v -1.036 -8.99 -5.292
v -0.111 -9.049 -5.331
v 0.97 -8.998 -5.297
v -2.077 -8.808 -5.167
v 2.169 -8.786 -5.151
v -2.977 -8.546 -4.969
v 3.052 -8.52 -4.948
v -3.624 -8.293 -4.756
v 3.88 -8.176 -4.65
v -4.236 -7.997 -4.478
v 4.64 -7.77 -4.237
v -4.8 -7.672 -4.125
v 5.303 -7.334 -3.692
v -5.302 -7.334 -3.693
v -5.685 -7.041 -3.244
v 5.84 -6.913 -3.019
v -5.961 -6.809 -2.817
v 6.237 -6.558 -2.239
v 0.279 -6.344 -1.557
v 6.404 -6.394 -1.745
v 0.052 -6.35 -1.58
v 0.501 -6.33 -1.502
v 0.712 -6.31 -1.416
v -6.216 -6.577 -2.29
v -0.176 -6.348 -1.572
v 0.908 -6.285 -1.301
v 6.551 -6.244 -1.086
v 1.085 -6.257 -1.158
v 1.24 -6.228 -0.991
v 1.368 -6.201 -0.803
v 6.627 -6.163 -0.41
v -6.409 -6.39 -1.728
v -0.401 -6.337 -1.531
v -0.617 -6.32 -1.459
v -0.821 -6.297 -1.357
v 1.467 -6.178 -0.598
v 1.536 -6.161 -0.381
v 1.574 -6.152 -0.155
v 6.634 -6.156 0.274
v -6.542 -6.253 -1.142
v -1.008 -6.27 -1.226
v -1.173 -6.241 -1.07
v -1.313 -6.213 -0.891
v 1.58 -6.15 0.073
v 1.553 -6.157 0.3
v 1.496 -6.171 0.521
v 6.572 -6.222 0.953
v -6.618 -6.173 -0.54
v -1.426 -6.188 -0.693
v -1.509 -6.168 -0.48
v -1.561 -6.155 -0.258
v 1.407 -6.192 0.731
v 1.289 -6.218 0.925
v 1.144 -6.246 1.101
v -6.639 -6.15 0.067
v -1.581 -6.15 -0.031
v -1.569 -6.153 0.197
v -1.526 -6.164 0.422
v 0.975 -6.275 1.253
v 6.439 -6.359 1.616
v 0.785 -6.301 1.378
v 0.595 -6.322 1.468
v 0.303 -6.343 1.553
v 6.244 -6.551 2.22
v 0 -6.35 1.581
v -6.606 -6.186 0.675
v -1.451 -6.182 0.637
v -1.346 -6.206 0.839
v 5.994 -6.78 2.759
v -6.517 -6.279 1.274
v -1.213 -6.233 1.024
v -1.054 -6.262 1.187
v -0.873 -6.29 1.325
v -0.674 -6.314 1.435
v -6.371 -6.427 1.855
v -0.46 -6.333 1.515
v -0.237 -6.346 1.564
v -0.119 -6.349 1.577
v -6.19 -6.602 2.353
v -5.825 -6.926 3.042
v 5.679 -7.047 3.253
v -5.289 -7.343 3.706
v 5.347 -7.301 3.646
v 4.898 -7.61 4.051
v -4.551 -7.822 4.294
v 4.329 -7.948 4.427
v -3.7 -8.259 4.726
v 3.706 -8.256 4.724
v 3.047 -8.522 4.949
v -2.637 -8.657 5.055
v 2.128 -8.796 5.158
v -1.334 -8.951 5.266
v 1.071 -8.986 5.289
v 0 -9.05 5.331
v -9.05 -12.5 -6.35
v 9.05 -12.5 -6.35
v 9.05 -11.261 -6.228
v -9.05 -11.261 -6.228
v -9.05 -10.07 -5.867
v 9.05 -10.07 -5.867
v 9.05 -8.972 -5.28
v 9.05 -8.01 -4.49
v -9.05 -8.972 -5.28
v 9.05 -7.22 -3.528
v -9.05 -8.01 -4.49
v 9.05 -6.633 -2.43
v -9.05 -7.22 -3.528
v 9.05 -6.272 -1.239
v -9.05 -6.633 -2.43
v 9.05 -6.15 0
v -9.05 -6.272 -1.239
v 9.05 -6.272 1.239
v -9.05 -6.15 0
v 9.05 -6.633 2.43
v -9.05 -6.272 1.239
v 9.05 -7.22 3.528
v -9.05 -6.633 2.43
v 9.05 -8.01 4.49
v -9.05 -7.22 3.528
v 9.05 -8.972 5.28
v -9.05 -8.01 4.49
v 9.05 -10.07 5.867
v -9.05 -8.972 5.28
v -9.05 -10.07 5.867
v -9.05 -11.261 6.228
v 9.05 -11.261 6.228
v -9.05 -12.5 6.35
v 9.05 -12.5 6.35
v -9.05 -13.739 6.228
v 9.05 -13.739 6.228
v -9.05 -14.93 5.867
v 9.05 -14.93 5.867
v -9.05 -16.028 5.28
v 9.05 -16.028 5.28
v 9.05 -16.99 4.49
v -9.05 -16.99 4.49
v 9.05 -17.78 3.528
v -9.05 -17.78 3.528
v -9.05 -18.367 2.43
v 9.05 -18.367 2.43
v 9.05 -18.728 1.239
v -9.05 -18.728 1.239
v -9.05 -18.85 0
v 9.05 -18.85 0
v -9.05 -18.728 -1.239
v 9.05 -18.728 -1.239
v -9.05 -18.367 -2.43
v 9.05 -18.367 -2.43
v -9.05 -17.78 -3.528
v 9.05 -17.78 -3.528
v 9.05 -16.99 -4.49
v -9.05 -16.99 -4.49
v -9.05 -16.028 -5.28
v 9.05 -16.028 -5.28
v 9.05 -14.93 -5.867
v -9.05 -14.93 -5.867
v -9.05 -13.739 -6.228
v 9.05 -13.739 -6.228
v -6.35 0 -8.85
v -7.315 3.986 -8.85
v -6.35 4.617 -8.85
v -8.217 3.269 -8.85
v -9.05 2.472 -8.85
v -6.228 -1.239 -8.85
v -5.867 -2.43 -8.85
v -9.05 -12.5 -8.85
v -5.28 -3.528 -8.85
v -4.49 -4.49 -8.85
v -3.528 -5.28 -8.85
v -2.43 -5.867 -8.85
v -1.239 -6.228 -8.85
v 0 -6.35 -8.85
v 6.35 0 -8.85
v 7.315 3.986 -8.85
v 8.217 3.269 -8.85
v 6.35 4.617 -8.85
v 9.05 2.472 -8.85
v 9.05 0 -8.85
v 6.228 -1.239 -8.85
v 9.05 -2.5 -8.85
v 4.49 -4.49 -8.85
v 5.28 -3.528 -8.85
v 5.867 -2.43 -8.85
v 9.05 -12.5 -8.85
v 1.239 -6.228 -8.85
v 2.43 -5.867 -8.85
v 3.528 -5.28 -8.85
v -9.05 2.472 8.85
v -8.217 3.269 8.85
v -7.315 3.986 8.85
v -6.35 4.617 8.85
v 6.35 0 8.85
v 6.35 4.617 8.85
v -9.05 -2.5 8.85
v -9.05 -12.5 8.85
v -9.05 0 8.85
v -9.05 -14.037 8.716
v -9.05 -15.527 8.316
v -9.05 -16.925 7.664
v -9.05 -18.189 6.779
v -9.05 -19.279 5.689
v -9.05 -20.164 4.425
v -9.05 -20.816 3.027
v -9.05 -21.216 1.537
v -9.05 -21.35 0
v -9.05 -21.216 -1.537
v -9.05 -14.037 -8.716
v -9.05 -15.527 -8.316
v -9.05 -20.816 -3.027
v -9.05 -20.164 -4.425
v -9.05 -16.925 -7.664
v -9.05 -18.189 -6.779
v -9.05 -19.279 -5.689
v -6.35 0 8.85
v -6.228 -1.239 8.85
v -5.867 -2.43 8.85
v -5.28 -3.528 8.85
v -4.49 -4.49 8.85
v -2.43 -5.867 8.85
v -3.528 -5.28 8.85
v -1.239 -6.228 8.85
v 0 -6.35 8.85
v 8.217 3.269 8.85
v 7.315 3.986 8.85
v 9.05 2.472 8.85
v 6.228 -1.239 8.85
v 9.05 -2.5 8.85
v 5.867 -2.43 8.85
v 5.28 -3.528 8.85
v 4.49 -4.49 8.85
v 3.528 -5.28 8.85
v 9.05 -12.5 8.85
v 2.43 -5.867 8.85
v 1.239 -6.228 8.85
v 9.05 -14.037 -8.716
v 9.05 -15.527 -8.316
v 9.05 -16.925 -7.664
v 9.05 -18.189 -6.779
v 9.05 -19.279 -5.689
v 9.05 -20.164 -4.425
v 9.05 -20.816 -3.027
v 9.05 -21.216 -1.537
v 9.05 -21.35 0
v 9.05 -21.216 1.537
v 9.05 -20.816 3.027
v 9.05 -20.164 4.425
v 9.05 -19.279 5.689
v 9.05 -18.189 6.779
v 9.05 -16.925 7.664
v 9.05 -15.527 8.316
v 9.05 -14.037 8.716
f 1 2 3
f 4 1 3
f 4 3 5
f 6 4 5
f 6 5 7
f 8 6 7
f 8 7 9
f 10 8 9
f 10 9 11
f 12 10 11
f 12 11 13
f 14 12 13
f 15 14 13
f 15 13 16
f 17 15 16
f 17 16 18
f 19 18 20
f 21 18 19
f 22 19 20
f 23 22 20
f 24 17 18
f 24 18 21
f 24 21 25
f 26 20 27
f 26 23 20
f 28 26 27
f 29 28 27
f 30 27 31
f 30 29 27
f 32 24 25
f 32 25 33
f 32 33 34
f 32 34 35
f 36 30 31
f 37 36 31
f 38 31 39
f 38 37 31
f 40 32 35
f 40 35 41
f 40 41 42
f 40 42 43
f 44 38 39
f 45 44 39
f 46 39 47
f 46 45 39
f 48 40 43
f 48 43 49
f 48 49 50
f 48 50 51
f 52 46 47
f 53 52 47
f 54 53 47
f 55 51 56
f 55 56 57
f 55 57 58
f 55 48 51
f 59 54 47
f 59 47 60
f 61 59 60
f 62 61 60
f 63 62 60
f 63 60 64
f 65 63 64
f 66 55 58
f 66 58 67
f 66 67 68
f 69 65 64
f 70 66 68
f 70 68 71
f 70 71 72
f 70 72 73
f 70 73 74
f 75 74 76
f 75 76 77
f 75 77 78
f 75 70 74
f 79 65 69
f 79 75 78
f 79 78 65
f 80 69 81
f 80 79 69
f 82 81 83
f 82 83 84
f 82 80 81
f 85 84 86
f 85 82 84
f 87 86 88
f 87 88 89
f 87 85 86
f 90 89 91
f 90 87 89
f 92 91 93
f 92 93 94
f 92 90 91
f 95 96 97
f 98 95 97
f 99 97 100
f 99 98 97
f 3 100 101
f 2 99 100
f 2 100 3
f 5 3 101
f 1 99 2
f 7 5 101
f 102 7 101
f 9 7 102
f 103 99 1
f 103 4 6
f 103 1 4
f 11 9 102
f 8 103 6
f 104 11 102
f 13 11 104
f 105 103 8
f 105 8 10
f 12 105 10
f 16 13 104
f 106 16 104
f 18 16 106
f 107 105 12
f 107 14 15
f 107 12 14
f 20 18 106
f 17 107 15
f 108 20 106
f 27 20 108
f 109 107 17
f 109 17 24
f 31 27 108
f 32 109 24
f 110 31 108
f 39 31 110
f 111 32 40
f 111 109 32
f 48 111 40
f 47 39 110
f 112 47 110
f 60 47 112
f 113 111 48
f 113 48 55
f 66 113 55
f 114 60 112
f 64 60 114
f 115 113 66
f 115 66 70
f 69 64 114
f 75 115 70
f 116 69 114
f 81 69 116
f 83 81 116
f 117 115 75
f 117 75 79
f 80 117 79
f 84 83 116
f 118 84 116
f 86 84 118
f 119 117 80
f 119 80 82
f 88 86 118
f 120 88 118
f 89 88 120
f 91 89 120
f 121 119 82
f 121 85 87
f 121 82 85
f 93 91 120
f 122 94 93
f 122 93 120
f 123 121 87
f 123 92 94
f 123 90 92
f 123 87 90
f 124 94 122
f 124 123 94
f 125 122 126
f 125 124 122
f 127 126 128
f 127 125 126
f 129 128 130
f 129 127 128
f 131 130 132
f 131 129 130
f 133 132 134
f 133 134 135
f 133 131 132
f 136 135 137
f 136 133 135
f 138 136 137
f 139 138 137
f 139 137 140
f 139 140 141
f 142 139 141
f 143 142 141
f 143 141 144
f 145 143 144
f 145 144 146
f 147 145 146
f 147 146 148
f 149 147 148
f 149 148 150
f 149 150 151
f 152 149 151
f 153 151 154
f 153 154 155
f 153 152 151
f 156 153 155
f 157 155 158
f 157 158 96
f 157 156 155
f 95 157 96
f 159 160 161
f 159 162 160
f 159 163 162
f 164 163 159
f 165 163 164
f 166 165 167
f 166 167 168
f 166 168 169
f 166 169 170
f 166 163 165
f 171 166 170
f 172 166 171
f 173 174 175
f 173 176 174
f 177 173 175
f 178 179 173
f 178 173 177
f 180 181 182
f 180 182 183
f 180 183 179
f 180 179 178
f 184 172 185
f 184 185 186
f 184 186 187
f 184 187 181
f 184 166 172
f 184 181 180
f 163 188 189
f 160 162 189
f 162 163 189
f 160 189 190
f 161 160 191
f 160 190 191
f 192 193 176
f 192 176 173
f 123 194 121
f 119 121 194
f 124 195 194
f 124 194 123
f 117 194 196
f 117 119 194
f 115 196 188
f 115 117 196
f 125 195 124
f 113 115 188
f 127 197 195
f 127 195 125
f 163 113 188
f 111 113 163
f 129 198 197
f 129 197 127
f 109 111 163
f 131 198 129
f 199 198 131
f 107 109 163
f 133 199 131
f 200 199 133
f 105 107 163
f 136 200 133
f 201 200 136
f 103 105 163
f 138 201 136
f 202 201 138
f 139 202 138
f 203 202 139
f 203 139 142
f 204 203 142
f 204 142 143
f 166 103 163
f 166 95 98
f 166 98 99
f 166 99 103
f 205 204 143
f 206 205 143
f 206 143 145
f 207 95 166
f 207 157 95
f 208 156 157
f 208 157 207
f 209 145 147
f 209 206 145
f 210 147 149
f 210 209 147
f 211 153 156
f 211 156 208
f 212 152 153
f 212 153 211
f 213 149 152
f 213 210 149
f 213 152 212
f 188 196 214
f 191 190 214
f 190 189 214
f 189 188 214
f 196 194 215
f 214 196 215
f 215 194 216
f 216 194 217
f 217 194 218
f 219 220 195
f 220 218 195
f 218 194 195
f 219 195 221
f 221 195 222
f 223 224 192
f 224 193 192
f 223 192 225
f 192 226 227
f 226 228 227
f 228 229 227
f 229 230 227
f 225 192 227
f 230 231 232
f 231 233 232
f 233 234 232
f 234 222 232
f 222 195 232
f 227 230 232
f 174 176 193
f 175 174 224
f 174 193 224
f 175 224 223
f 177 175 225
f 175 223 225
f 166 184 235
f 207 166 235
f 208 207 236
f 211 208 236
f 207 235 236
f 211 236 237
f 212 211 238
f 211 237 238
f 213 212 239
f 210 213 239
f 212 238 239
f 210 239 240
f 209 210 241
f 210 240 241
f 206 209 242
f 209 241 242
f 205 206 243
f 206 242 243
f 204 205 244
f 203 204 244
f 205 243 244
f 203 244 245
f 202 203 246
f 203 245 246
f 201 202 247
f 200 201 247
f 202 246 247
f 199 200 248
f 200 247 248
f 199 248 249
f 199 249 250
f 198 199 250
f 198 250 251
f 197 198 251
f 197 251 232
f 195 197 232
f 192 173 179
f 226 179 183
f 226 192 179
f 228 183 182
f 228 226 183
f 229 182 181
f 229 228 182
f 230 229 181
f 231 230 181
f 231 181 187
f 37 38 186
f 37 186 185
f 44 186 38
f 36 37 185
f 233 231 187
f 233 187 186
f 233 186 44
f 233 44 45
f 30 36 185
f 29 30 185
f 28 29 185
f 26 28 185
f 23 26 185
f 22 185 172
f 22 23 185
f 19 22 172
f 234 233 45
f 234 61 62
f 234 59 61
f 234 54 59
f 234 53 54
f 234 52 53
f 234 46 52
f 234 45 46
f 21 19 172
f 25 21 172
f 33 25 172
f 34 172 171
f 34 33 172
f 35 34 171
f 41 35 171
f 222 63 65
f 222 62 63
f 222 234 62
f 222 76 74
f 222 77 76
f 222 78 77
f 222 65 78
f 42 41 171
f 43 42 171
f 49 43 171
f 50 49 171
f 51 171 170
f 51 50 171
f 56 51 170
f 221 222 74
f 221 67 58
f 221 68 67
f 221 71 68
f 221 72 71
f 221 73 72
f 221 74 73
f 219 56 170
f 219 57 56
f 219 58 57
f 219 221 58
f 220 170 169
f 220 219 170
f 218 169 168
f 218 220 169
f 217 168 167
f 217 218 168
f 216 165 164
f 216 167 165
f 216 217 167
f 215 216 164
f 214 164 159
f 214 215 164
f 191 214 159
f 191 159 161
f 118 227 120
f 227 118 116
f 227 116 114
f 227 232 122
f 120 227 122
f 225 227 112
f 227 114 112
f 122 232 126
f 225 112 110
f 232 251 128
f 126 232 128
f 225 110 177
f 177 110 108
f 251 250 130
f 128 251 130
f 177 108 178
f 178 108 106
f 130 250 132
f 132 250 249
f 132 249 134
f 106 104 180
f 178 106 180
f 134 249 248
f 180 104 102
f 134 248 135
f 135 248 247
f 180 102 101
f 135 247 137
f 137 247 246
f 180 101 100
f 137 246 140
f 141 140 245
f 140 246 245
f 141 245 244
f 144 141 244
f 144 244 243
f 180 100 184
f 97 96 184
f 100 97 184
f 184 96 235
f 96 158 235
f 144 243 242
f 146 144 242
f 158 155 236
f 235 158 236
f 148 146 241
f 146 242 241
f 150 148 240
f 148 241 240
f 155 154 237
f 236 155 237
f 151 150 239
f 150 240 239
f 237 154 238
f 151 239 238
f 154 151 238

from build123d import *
from build123d.topology import SkipClean

# Parameters (mm, degrees)
BODY_SPAR_LINK_DEPTH                               = 8.85
SKETCH2_R                                          = 6.35
WING_SPAR_EXTRUDE_DEPTH                            = 9.05
SMALL_CUT_COMPLETION_REACH                         = 24.706
SKETCH3_W                                          = 0.352155439
SKETCH3_H                                          = 17.7
CUT_CLEANUP_DEPTH                                  = 30.172161479
CUT_CLEANUP_DEPTH_BACK                             = 30.172161479
SKETCH4_R                                          = 6.35
EDGE_ROUNDING_TO_FIT_END_CAP_OF_FUSELAG_DEPTH      = 30.172161479
EDGE_ROUNDING_TO_FIT_END_CAP_OF_FUSELAG_DEPTH_BACK = 30.172161479
WING_SPAR_CUT_CLEANUP_DEPTH                        = 30.355663941
WING_SPAR_CUT_CLEANUP_DEPTH_BACK                   = 30.355663941
SKETCH6_R                                          = 6.35


with BuildPart() as part:
    # Sketch1 → Body spar link (new, symmetric)
    with BuildSketch(Plane.XY):
        with BuildLine():
            Line((-6.35, 0), (-6.35, 5.93510313))
            add(Edge.make_bspline(
                [(-6.35, 5.93510313), (-7.712058184, 5.755612708), (-9.05, 5.499803523)],
                knots=[1.753235264, 1.753235264, 1.753235264, 1.832339372, 1.832339372, 1.832339372], degree=2, weights=[1, 0.999217919, 1]))
            Line((-9.05, 5.499803523), (-9.05, 0))
            ThreePointArc((-9.05, 0), (0, -9.05), (9.05, 0))
            Line((9.05, 0), (9.05, 5.499803523))
            add(Edge.make_bspline(
                [(9.05, 5.499803523), (7.712058184, 5.755612708), (6.35, 5.93510313)],
                knots=[4.450845935, 4.450845935, 4.450845935, 4.529950043, 4.529950043, 4.529950043], degree=2, weights=[1, 0.999217919, 1]))
            Line((6.35, 5.93510313), (6.35, 0))
            ThreePointArc((6.35, 0), (0, -6.35), (-6.35, 0))
        make_face()
    extrude(amount=BODY_SPAR_LINK_DEPTH, both=True)

    # Sketch2 → Wing spar extrude (add, symmetric)
    with BuildSketch(Plane(origin=(0, 0, 0), x_dir=(0, 0, -1), z_dir=(1, 0, 0))):
        with BuildLine():
            Line((-8.85, -12.5), (-8.85, -2.5))
            Line((-8.85, -2.5), (8.85, -2.5))
            Line((8.85, -2.5), (8.85, -12.5))
            ThreePointArc((8.85, -12.5), (0, -21.35), (-8.85, -12.5))
        make_face()
        with Locations((0, -12.5)):
            Circle(SKETCH2_R, mode=Mode.SUBTRACT)
    extrude(amount=WING_SPAR_EXTRUDE_DEPTH, both=True)

    # Sketch3 → Small cut completion (add, up to next)
    with BuildSketch(Plane(origin=(0, -2.5, 0), x_dir=(1, 0, 0), z_dir=(0, 1, 0)), mode=Mode.PRIVATE) as small_cut_completion_sk1:
        with Locations((8.873922281, 0)):
            Rectangle(SKETCH3_W, SKETCH3_H)
    small_cut_completion_tool1 = extrude(small_cut_completion_sk1.sketch, amount=SMALL_CUT_COMPLETION_REACH, mode=Mode.PRIVATE) - part.part
    # Sketch3 → Small cut completion (add, up to next)
    with BuildSketch(Plane(origin=(0, -2.5, 0), x_dir=(1, 0, 0), z_dir=(0, 1, 0)), mode=Mode.PRIVATE) as small_cut_completion_sk2:
        with Locations((-8.873922281, 0)):
            Rectangle(SKETCH3_W, SKETCH3_H)
    small_cut_completion_tool2 = extrude(small_cut_completion_sk2.sketch, amount=SMALL_CUT_COMPLETION_REACH, mode=Mode.PRIVATE) - part.part
    add(small_cut_completion_tool1.solids().sort_by_distance((8.873922, -2.5, 0))[0])
    add(small_cut_completion_tool2.solids().sort_by_distance((-8.873922, -2.5, 0))[0])

    # Sketch4 → Cut cleanup (cut, two sides: drawn at the far end of the back side and taken through both)
    with SkipClean():  # the faces are left unmerged after this step: merging them gives an invalid solid
        with BuildSketch(Plane(origin=(0, 0, -8.85), x_dir=(-1, 0, 0), z_dir=(0, 0, -1)).offset(-CUT_CLEANUP_DEPTH_BACK)):
            Circle(SKETCH4_R)
        extrude(amount=CUT_CLEANUP_DEPTH + CUT_CLEANUP_DEPTH_BACK, mode=Mode.SUBTRACT)

    # Sketch5 → Edge rounding (to fit end cap of fuselage) (cut, two sides: drawn at the far end of the back side and taken through both)
    with SkipClean():  # the faces are left unmerged after this step: merging them gives an invalid solid
        with BuildSketch(Plane(origin=(0, 0, -8.85), x_dir=(-1, 0, 0), z_dir=(0, 0, -1)).offset(-EDGE_ROUNDING_TO_FIT_END_CAP_OF_FUSELAG_DEPTH_BACK)):
            with BuildLine():
                Line((-12.5, -6.15), (-22.5, -6.15))
                ThreePointArc((-22.5, -6.15), (0, 16.35), (22.5, -6.15))
                Line((22.5, -6.15), (12.5, -6.15))
                ThreePointArc((12.5, -6.15), (0, 6.35), (-12.5, -6.15))
            make_face()
        extrude(amount=EDGE_ROUNDING_TO_FIT_END_CAP_OF_FUSELAG_DEPTH + EDGE_ROUNDING_TO_FIT_END_CAP_OF_FUSELAG_DEPTH_BACK, mode=Mode.SUBTRACT)

    # Sketch6 → Wing spar cut cleanup (cut, two sides: drawn at the far end of the back side and taken through both)
    with BuildSketch(Plane(origin=(9.05, 0, 0), x_dir=(0, 0, -1), z_dir=(1, 0, 0)).offset(-WING_SPAR_CUT_CLEANUP_DEPTH_BACK)):
        with Locations((0, -12.5)):
            Circle(SKETCH6_R)
    extrude(amount=WING_SPAR_CUT_CLEANUP_DEPTH + WING_SPAR_CUT_CLEANUP_DEPTH_BACK, mode=Mode.SUBTRACT)


solid = part.part
